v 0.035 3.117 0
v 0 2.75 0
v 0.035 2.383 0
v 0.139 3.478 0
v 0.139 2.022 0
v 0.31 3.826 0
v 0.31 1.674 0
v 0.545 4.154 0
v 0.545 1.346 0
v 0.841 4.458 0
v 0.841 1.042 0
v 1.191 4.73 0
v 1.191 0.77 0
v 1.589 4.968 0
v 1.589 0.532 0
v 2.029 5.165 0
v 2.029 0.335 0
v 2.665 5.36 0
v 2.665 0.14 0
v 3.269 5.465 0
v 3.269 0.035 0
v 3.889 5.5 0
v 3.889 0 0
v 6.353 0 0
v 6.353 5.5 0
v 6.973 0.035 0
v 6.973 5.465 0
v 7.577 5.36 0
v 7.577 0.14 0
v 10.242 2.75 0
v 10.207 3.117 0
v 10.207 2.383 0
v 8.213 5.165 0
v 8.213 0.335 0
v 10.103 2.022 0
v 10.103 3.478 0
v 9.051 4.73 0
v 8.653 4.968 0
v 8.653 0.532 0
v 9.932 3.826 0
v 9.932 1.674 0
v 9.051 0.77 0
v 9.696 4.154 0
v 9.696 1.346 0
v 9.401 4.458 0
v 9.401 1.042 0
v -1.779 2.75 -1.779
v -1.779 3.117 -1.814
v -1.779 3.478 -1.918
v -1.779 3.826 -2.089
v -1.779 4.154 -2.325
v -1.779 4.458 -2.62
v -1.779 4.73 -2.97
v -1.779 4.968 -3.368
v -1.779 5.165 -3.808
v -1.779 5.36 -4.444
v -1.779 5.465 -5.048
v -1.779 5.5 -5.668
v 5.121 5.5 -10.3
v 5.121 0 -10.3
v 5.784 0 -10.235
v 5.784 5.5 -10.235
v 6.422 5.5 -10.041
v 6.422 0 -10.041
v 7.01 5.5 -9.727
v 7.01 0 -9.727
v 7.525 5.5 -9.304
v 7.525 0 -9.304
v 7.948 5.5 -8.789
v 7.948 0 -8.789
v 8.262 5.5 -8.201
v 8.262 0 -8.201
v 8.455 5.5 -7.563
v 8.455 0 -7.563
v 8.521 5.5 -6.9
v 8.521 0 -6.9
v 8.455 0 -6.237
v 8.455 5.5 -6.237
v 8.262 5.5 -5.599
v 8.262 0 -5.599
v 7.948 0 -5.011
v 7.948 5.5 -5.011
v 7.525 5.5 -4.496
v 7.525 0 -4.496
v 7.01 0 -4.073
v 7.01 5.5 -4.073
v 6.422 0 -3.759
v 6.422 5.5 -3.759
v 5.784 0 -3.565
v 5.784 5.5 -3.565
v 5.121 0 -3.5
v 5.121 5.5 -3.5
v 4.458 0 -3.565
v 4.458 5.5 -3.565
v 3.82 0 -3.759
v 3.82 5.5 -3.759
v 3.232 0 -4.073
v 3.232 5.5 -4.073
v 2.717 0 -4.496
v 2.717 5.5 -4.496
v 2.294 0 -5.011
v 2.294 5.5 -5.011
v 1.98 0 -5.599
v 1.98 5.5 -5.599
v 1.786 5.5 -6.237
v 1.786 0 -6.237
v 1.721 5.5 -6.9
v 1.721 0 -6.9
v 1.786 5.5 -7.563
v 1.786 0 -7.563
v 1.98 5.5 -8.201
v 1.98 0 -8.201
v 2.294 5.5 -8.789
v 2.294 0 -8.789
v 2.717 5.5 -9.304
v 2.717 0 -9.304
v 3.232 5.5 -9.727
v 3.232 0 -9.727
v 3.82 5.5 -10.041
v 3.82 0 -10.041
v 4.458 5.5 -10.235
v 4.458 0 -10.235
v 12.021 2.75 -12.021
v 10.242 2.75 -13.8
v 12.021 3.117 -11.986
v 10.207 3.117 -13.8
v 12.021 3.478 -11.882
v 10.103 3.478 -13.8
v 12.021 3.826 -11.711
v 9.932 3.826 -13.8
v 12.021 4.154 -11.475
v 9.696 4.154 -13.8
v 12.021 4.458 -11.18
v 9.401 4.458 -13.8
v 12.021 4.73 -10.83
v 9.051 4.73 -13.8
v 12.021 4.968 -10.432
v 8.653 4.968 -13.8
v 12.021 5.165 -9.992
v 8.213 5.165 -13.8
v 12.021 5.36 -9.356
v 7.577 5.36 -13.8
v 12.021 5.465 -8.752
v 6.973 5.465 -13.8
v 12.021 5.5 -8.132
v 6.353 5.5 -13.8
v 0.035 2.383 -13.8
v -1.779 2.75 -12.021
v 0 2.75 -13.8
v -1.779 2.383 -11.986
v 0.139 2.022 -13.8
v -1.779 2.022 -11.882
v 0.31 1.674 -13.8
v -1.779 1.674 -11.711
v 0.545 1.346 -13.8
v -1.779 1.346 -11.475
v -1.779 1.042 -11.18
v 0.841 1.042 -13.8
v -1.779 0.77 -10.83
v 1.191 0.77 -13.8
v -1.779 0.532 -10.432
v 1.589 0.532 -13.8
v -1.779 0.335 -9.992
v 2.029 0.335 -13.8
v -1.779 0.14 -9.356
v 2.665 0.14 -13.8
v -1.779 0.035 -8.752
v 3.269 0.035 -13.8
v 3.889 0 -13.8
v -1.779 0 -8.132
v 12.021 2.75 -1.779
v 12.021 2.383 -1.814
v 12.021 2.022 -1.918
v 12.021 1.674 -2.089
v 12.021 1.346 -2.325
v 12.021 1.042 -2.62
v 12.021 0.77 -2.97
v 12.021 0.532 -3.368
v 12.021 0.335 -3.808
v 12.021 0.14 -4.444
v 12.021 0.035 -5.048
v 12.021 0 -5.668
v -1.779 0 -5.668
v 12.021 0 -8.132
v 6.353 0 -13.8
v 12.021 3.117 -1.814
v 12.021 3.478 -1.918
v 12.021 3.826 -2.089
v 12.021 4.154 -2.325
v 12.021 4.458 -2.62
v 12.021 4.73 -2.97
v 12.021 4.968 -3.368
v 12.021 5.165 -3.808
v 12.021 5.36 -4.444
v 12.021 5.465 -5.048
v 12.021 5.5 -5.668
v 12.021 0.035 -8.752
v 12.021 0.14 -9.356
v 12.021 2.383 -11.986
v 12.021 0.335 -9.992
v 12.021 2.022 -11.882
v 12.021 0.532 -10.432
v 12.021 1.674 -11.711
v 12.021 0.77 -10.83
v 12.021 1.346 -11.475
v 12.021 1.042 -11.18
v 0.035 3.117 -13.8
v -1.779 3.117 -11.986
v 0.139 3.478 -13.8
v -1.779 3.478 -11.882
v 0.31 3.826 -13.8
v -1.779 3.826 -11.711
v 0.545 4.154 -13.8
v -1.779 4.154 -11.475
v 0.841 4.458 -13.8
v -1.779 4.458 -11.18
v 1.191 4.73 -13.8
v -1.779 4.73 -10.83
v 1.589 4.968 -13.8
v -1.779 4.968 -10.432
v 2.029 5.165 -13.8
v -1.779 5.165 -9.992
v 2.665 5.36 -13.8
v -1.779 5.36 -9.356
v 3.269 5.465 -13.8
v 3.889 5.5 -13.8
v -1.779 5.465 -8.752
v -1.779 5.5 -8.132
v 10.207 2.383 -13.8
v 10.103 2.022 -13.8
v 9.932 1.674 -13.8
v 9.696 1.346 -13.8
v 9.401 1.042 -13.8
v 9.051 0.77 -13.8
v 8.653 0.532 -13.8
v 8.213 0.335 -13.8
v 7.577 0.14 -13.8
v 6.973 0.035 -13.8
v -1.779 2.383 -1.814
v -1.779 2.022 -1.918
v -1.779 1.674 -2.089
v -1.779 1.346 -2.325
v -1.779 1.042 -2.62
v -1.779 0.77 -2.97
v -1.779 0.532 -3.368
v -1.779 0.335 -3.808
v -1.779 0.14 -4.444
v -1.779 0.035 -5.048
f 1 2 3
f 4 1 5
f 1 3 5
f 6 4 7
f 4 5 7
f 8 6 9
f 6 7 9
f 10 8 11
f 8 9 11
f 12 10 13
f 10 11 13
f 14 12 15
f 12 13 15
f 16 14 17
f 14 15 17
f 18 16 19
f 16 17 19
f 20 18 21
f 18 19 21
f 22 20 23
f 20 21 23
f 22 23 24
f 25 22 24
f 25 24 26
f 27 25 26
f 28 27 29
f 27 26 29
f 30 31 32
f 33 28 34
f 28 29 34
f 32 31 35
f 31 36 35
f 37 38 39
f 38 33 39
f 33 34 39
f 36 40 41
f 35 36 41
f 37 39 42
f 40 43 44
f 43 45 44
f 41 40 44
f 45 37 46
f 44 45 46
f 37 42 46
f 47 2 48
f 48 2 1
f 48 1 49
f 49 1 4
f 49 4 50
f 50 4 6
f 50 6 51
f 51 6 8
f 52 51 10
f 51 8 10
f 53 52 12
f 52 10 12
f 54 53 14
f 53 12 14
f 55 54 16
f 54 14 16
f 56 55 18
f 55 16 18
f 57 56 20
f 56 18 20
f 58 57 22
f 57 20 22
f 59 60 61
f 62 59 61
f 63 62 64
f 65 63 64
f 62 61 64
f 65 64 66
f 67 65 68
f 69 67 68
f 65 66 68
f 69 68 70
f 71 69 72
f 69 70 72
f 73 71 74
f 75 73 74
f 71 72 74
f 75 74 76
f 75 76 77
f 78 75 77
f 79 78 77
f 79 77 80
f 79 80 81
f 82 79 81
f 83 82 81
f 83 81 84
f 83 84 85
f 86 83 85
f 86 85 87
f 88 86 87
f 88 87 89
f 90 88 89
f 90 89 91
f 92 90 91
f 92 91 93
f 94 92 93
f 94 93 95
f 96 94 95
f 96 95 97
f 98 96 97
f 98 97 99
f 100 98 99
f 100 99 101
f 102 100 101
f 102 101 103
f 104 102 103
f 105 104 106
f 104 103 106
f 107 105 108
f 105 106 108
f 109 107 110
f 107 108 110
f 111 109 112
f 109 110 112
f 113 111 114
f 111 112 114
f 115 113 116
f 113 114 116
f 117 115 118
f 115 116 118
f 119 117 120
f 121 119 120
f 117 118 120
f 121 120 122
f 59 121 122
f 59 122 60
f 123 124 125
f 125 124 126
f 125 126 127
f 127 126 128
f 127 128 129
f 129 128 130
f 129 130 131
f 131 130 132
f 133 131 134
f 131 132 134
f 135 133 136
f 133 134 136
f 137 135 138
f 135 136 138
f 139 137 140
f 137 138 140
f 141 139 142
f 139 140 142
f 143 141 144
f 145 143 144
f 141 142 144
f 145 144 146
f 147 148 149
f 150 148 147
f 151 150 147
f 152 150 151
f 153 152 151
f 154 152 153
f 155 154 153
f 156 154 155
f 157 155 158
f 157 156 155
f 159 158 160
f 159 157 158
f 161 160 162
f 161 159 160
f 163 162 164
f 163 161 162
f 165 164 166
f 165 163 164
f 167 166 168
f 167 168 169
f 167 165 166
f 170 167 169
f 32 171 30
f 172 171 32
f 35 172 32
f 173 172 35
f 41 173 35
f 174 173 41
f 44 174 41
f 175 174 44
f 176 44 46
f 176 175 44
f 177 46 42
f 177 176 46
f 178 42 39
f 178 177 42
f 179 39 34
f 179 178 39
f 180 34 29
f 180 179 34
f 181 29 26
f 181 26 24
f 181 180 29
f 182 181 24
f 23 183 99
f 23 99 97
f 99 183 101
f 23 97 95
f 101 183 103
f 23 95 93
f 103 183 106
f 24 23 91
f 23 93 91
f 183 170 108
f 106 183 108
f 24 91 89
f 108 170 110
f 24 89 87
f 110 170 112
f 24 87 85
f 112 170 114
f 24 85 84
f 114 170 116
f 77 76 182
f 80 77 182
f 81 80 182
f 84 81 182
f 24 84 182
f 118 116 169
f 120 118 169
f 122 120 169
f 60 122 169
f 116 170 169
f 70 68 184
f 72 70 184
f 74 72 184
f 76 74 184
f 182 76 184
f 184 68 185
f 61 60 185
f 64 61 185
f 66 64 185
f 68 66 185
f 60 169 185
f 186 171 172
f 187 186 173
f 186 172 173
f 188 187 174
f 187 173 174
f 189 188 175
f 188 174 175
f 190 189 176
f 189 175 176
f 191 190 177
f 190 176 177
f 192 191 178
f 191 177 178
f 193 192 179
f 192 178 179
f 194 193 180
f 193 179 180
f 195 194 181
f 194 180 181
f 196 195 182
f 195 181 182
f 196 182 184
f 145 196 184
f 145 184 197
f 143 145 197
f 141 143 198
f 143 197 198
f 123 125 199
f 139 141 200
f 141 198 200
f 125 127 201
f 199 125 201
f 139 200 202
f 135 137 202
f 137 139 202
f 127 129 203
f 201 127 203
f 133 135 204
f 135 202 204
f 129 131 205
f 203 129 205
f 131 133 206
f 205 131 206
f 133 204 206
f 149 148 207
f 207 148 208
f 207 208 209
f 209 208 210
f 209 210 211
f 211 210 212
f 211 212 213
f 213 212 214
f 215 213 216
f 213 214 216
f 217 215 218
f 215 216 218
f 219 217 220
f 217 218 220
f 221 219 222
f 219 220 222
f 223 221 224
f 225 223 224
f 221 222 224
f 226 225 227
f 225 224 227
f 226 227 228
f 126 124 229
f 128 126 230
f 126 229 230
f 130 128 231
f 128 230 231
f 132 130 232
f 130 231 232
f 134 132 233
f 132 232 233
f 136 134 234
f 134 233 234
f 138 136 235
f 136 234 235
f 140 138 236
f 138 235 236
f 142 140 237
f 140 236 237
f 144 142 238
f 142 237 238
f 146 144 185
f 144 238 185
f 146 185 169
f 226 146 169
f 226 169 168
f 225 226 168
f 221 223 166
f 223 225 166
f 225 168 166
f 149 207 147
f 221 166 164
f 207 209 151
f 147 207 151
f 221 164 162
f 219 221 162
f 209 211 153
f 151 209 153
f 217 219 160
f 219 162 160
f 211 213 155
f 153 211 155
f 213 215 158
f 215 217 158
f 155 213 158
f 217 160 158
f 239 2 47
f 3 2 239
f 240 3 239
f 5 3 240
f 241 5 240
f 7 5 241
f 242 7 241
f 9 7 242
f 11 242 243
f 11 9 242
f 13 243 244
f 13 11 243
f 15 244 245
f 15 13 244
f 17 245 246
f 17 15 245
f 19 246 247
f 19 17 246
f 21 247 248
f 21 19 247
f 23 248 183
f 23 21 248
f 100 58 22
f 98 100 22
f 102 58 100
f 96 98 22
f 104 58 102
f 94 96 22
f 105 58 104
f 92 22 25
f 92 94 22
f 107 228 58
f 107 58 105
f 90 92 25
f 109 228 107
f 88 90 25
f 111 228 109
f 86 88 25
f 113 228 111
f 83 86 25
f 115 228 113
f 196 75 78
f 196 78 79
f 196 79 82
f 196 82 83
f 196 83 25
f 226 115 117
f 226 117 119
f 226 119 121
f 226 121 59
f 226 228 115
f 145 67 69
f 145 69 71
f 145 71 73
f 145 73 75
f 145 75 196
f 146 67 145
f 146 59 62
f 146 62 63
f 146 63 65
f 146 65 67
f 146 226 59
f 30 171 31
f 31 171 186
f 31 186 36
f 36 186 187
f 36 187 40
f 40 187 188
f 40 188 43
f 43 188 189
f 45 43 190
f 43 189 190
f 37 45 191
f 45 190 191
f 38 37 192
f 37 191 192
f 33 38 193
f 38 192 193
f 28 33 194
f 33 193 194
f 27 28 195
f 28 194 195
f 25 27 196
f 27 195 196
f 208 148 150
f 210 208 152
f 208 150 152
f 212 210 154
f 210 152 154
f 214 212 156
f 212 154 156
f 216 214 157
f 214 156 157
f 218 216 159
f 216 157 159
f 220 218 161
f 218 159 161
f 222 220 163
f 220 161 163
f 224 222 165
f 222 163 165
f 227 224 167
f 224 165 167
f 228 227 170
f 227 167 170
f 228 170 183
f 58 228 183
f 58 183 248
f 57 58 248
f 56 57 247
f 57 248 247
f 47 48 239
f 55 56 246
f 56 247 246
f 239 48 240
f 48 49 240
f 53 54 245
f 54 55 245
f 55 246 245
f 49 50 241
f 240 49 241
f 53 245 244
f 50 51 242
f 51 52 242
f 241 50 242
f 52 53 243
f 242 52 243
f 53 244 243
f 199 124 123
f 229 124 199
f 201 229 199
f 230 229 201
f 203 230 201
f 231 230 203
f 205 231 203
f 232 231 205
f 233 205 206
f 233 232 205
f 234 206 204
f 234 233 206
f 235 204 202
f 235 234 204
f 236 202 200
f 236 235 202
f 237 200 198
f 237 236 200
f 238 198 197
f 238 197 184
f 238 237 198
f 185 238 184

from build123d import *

# Parameters (mm, degrees)
EXTRUDE_1_DEPTH        = 5.5
FILLET_1_R             = 2.75
HOLE_WIZARD_M8_1_D     = 6.8
HOLE_WIZARD_M8_1_DEPTH = 19.75
HOLE_WIZARD_M8_1_TIP   = 2.042926105


with BuildPart() as part:
    # 草图1 → 凸台-拉伸1 (new body)
    with BuildSketch(Plane(origin=(0, 0, 0), x_dir=(1, 0, 0), z_dir=(0, 1, 0))):
        Polygon((0, 0), (10.24163056, 0), (12.02081528, 1.77918472), (12.02081528, 12.02081528), (10.24163056, 13.8), (0, 13.8), (-1.77918472, 12.02081528), (-1.77918472, 1.77918472), align=None)
    extrude(amount=EXTRUDE_1_DEPTH)

    # 圆角1
    fillet_1_edges = [part.edges().sort_by_distance(p)[0] for p in [
        (-0.88959236, 0, -12.91040764),
        (-0.88959236, 5.5, -12.91040764),
        (11.13122292, 0, -12.91040764),
        (11.13122292, 5.5, -12.91040764),
        (11.13122292, 0, -0.88959236),
        (11.13122292, 5.5, -0.88959236),
        (-0.88959236, 0, -0.88959236),
        (-0.88959236, 5.5, -0.88959236),
    ]]
    fillet(fillet_1_edges, radius=FILLET_1_R - 0.0001)  # a hair under: the kernel refuses the full size

    # M8 螺纹孔1
    with Locations(Plane(origin=(5.12081528, 5.5, -6.9), x_dir=(0, 0, 1), z_dir=(0, 1, 0))):
        with Locations((0, 0)):
            Hole(HOLE_WIZARD_M8_1_D / 2, depth=HOLE_WIZARD_M8_1_DEPTH)
            with Locations((0, 0, -(HOLE_WIZARD_M8_1_DEPTH + HOLE_WIZARD_M8_1_TIP / 2))):  # 118° drill point
                Cone(0, HOLE_WIZARD_M8_1_D / 2, HOLE_WIZARD_M8_1_TIP, mode=Mode.SUBTRACT)


solid = part.part
